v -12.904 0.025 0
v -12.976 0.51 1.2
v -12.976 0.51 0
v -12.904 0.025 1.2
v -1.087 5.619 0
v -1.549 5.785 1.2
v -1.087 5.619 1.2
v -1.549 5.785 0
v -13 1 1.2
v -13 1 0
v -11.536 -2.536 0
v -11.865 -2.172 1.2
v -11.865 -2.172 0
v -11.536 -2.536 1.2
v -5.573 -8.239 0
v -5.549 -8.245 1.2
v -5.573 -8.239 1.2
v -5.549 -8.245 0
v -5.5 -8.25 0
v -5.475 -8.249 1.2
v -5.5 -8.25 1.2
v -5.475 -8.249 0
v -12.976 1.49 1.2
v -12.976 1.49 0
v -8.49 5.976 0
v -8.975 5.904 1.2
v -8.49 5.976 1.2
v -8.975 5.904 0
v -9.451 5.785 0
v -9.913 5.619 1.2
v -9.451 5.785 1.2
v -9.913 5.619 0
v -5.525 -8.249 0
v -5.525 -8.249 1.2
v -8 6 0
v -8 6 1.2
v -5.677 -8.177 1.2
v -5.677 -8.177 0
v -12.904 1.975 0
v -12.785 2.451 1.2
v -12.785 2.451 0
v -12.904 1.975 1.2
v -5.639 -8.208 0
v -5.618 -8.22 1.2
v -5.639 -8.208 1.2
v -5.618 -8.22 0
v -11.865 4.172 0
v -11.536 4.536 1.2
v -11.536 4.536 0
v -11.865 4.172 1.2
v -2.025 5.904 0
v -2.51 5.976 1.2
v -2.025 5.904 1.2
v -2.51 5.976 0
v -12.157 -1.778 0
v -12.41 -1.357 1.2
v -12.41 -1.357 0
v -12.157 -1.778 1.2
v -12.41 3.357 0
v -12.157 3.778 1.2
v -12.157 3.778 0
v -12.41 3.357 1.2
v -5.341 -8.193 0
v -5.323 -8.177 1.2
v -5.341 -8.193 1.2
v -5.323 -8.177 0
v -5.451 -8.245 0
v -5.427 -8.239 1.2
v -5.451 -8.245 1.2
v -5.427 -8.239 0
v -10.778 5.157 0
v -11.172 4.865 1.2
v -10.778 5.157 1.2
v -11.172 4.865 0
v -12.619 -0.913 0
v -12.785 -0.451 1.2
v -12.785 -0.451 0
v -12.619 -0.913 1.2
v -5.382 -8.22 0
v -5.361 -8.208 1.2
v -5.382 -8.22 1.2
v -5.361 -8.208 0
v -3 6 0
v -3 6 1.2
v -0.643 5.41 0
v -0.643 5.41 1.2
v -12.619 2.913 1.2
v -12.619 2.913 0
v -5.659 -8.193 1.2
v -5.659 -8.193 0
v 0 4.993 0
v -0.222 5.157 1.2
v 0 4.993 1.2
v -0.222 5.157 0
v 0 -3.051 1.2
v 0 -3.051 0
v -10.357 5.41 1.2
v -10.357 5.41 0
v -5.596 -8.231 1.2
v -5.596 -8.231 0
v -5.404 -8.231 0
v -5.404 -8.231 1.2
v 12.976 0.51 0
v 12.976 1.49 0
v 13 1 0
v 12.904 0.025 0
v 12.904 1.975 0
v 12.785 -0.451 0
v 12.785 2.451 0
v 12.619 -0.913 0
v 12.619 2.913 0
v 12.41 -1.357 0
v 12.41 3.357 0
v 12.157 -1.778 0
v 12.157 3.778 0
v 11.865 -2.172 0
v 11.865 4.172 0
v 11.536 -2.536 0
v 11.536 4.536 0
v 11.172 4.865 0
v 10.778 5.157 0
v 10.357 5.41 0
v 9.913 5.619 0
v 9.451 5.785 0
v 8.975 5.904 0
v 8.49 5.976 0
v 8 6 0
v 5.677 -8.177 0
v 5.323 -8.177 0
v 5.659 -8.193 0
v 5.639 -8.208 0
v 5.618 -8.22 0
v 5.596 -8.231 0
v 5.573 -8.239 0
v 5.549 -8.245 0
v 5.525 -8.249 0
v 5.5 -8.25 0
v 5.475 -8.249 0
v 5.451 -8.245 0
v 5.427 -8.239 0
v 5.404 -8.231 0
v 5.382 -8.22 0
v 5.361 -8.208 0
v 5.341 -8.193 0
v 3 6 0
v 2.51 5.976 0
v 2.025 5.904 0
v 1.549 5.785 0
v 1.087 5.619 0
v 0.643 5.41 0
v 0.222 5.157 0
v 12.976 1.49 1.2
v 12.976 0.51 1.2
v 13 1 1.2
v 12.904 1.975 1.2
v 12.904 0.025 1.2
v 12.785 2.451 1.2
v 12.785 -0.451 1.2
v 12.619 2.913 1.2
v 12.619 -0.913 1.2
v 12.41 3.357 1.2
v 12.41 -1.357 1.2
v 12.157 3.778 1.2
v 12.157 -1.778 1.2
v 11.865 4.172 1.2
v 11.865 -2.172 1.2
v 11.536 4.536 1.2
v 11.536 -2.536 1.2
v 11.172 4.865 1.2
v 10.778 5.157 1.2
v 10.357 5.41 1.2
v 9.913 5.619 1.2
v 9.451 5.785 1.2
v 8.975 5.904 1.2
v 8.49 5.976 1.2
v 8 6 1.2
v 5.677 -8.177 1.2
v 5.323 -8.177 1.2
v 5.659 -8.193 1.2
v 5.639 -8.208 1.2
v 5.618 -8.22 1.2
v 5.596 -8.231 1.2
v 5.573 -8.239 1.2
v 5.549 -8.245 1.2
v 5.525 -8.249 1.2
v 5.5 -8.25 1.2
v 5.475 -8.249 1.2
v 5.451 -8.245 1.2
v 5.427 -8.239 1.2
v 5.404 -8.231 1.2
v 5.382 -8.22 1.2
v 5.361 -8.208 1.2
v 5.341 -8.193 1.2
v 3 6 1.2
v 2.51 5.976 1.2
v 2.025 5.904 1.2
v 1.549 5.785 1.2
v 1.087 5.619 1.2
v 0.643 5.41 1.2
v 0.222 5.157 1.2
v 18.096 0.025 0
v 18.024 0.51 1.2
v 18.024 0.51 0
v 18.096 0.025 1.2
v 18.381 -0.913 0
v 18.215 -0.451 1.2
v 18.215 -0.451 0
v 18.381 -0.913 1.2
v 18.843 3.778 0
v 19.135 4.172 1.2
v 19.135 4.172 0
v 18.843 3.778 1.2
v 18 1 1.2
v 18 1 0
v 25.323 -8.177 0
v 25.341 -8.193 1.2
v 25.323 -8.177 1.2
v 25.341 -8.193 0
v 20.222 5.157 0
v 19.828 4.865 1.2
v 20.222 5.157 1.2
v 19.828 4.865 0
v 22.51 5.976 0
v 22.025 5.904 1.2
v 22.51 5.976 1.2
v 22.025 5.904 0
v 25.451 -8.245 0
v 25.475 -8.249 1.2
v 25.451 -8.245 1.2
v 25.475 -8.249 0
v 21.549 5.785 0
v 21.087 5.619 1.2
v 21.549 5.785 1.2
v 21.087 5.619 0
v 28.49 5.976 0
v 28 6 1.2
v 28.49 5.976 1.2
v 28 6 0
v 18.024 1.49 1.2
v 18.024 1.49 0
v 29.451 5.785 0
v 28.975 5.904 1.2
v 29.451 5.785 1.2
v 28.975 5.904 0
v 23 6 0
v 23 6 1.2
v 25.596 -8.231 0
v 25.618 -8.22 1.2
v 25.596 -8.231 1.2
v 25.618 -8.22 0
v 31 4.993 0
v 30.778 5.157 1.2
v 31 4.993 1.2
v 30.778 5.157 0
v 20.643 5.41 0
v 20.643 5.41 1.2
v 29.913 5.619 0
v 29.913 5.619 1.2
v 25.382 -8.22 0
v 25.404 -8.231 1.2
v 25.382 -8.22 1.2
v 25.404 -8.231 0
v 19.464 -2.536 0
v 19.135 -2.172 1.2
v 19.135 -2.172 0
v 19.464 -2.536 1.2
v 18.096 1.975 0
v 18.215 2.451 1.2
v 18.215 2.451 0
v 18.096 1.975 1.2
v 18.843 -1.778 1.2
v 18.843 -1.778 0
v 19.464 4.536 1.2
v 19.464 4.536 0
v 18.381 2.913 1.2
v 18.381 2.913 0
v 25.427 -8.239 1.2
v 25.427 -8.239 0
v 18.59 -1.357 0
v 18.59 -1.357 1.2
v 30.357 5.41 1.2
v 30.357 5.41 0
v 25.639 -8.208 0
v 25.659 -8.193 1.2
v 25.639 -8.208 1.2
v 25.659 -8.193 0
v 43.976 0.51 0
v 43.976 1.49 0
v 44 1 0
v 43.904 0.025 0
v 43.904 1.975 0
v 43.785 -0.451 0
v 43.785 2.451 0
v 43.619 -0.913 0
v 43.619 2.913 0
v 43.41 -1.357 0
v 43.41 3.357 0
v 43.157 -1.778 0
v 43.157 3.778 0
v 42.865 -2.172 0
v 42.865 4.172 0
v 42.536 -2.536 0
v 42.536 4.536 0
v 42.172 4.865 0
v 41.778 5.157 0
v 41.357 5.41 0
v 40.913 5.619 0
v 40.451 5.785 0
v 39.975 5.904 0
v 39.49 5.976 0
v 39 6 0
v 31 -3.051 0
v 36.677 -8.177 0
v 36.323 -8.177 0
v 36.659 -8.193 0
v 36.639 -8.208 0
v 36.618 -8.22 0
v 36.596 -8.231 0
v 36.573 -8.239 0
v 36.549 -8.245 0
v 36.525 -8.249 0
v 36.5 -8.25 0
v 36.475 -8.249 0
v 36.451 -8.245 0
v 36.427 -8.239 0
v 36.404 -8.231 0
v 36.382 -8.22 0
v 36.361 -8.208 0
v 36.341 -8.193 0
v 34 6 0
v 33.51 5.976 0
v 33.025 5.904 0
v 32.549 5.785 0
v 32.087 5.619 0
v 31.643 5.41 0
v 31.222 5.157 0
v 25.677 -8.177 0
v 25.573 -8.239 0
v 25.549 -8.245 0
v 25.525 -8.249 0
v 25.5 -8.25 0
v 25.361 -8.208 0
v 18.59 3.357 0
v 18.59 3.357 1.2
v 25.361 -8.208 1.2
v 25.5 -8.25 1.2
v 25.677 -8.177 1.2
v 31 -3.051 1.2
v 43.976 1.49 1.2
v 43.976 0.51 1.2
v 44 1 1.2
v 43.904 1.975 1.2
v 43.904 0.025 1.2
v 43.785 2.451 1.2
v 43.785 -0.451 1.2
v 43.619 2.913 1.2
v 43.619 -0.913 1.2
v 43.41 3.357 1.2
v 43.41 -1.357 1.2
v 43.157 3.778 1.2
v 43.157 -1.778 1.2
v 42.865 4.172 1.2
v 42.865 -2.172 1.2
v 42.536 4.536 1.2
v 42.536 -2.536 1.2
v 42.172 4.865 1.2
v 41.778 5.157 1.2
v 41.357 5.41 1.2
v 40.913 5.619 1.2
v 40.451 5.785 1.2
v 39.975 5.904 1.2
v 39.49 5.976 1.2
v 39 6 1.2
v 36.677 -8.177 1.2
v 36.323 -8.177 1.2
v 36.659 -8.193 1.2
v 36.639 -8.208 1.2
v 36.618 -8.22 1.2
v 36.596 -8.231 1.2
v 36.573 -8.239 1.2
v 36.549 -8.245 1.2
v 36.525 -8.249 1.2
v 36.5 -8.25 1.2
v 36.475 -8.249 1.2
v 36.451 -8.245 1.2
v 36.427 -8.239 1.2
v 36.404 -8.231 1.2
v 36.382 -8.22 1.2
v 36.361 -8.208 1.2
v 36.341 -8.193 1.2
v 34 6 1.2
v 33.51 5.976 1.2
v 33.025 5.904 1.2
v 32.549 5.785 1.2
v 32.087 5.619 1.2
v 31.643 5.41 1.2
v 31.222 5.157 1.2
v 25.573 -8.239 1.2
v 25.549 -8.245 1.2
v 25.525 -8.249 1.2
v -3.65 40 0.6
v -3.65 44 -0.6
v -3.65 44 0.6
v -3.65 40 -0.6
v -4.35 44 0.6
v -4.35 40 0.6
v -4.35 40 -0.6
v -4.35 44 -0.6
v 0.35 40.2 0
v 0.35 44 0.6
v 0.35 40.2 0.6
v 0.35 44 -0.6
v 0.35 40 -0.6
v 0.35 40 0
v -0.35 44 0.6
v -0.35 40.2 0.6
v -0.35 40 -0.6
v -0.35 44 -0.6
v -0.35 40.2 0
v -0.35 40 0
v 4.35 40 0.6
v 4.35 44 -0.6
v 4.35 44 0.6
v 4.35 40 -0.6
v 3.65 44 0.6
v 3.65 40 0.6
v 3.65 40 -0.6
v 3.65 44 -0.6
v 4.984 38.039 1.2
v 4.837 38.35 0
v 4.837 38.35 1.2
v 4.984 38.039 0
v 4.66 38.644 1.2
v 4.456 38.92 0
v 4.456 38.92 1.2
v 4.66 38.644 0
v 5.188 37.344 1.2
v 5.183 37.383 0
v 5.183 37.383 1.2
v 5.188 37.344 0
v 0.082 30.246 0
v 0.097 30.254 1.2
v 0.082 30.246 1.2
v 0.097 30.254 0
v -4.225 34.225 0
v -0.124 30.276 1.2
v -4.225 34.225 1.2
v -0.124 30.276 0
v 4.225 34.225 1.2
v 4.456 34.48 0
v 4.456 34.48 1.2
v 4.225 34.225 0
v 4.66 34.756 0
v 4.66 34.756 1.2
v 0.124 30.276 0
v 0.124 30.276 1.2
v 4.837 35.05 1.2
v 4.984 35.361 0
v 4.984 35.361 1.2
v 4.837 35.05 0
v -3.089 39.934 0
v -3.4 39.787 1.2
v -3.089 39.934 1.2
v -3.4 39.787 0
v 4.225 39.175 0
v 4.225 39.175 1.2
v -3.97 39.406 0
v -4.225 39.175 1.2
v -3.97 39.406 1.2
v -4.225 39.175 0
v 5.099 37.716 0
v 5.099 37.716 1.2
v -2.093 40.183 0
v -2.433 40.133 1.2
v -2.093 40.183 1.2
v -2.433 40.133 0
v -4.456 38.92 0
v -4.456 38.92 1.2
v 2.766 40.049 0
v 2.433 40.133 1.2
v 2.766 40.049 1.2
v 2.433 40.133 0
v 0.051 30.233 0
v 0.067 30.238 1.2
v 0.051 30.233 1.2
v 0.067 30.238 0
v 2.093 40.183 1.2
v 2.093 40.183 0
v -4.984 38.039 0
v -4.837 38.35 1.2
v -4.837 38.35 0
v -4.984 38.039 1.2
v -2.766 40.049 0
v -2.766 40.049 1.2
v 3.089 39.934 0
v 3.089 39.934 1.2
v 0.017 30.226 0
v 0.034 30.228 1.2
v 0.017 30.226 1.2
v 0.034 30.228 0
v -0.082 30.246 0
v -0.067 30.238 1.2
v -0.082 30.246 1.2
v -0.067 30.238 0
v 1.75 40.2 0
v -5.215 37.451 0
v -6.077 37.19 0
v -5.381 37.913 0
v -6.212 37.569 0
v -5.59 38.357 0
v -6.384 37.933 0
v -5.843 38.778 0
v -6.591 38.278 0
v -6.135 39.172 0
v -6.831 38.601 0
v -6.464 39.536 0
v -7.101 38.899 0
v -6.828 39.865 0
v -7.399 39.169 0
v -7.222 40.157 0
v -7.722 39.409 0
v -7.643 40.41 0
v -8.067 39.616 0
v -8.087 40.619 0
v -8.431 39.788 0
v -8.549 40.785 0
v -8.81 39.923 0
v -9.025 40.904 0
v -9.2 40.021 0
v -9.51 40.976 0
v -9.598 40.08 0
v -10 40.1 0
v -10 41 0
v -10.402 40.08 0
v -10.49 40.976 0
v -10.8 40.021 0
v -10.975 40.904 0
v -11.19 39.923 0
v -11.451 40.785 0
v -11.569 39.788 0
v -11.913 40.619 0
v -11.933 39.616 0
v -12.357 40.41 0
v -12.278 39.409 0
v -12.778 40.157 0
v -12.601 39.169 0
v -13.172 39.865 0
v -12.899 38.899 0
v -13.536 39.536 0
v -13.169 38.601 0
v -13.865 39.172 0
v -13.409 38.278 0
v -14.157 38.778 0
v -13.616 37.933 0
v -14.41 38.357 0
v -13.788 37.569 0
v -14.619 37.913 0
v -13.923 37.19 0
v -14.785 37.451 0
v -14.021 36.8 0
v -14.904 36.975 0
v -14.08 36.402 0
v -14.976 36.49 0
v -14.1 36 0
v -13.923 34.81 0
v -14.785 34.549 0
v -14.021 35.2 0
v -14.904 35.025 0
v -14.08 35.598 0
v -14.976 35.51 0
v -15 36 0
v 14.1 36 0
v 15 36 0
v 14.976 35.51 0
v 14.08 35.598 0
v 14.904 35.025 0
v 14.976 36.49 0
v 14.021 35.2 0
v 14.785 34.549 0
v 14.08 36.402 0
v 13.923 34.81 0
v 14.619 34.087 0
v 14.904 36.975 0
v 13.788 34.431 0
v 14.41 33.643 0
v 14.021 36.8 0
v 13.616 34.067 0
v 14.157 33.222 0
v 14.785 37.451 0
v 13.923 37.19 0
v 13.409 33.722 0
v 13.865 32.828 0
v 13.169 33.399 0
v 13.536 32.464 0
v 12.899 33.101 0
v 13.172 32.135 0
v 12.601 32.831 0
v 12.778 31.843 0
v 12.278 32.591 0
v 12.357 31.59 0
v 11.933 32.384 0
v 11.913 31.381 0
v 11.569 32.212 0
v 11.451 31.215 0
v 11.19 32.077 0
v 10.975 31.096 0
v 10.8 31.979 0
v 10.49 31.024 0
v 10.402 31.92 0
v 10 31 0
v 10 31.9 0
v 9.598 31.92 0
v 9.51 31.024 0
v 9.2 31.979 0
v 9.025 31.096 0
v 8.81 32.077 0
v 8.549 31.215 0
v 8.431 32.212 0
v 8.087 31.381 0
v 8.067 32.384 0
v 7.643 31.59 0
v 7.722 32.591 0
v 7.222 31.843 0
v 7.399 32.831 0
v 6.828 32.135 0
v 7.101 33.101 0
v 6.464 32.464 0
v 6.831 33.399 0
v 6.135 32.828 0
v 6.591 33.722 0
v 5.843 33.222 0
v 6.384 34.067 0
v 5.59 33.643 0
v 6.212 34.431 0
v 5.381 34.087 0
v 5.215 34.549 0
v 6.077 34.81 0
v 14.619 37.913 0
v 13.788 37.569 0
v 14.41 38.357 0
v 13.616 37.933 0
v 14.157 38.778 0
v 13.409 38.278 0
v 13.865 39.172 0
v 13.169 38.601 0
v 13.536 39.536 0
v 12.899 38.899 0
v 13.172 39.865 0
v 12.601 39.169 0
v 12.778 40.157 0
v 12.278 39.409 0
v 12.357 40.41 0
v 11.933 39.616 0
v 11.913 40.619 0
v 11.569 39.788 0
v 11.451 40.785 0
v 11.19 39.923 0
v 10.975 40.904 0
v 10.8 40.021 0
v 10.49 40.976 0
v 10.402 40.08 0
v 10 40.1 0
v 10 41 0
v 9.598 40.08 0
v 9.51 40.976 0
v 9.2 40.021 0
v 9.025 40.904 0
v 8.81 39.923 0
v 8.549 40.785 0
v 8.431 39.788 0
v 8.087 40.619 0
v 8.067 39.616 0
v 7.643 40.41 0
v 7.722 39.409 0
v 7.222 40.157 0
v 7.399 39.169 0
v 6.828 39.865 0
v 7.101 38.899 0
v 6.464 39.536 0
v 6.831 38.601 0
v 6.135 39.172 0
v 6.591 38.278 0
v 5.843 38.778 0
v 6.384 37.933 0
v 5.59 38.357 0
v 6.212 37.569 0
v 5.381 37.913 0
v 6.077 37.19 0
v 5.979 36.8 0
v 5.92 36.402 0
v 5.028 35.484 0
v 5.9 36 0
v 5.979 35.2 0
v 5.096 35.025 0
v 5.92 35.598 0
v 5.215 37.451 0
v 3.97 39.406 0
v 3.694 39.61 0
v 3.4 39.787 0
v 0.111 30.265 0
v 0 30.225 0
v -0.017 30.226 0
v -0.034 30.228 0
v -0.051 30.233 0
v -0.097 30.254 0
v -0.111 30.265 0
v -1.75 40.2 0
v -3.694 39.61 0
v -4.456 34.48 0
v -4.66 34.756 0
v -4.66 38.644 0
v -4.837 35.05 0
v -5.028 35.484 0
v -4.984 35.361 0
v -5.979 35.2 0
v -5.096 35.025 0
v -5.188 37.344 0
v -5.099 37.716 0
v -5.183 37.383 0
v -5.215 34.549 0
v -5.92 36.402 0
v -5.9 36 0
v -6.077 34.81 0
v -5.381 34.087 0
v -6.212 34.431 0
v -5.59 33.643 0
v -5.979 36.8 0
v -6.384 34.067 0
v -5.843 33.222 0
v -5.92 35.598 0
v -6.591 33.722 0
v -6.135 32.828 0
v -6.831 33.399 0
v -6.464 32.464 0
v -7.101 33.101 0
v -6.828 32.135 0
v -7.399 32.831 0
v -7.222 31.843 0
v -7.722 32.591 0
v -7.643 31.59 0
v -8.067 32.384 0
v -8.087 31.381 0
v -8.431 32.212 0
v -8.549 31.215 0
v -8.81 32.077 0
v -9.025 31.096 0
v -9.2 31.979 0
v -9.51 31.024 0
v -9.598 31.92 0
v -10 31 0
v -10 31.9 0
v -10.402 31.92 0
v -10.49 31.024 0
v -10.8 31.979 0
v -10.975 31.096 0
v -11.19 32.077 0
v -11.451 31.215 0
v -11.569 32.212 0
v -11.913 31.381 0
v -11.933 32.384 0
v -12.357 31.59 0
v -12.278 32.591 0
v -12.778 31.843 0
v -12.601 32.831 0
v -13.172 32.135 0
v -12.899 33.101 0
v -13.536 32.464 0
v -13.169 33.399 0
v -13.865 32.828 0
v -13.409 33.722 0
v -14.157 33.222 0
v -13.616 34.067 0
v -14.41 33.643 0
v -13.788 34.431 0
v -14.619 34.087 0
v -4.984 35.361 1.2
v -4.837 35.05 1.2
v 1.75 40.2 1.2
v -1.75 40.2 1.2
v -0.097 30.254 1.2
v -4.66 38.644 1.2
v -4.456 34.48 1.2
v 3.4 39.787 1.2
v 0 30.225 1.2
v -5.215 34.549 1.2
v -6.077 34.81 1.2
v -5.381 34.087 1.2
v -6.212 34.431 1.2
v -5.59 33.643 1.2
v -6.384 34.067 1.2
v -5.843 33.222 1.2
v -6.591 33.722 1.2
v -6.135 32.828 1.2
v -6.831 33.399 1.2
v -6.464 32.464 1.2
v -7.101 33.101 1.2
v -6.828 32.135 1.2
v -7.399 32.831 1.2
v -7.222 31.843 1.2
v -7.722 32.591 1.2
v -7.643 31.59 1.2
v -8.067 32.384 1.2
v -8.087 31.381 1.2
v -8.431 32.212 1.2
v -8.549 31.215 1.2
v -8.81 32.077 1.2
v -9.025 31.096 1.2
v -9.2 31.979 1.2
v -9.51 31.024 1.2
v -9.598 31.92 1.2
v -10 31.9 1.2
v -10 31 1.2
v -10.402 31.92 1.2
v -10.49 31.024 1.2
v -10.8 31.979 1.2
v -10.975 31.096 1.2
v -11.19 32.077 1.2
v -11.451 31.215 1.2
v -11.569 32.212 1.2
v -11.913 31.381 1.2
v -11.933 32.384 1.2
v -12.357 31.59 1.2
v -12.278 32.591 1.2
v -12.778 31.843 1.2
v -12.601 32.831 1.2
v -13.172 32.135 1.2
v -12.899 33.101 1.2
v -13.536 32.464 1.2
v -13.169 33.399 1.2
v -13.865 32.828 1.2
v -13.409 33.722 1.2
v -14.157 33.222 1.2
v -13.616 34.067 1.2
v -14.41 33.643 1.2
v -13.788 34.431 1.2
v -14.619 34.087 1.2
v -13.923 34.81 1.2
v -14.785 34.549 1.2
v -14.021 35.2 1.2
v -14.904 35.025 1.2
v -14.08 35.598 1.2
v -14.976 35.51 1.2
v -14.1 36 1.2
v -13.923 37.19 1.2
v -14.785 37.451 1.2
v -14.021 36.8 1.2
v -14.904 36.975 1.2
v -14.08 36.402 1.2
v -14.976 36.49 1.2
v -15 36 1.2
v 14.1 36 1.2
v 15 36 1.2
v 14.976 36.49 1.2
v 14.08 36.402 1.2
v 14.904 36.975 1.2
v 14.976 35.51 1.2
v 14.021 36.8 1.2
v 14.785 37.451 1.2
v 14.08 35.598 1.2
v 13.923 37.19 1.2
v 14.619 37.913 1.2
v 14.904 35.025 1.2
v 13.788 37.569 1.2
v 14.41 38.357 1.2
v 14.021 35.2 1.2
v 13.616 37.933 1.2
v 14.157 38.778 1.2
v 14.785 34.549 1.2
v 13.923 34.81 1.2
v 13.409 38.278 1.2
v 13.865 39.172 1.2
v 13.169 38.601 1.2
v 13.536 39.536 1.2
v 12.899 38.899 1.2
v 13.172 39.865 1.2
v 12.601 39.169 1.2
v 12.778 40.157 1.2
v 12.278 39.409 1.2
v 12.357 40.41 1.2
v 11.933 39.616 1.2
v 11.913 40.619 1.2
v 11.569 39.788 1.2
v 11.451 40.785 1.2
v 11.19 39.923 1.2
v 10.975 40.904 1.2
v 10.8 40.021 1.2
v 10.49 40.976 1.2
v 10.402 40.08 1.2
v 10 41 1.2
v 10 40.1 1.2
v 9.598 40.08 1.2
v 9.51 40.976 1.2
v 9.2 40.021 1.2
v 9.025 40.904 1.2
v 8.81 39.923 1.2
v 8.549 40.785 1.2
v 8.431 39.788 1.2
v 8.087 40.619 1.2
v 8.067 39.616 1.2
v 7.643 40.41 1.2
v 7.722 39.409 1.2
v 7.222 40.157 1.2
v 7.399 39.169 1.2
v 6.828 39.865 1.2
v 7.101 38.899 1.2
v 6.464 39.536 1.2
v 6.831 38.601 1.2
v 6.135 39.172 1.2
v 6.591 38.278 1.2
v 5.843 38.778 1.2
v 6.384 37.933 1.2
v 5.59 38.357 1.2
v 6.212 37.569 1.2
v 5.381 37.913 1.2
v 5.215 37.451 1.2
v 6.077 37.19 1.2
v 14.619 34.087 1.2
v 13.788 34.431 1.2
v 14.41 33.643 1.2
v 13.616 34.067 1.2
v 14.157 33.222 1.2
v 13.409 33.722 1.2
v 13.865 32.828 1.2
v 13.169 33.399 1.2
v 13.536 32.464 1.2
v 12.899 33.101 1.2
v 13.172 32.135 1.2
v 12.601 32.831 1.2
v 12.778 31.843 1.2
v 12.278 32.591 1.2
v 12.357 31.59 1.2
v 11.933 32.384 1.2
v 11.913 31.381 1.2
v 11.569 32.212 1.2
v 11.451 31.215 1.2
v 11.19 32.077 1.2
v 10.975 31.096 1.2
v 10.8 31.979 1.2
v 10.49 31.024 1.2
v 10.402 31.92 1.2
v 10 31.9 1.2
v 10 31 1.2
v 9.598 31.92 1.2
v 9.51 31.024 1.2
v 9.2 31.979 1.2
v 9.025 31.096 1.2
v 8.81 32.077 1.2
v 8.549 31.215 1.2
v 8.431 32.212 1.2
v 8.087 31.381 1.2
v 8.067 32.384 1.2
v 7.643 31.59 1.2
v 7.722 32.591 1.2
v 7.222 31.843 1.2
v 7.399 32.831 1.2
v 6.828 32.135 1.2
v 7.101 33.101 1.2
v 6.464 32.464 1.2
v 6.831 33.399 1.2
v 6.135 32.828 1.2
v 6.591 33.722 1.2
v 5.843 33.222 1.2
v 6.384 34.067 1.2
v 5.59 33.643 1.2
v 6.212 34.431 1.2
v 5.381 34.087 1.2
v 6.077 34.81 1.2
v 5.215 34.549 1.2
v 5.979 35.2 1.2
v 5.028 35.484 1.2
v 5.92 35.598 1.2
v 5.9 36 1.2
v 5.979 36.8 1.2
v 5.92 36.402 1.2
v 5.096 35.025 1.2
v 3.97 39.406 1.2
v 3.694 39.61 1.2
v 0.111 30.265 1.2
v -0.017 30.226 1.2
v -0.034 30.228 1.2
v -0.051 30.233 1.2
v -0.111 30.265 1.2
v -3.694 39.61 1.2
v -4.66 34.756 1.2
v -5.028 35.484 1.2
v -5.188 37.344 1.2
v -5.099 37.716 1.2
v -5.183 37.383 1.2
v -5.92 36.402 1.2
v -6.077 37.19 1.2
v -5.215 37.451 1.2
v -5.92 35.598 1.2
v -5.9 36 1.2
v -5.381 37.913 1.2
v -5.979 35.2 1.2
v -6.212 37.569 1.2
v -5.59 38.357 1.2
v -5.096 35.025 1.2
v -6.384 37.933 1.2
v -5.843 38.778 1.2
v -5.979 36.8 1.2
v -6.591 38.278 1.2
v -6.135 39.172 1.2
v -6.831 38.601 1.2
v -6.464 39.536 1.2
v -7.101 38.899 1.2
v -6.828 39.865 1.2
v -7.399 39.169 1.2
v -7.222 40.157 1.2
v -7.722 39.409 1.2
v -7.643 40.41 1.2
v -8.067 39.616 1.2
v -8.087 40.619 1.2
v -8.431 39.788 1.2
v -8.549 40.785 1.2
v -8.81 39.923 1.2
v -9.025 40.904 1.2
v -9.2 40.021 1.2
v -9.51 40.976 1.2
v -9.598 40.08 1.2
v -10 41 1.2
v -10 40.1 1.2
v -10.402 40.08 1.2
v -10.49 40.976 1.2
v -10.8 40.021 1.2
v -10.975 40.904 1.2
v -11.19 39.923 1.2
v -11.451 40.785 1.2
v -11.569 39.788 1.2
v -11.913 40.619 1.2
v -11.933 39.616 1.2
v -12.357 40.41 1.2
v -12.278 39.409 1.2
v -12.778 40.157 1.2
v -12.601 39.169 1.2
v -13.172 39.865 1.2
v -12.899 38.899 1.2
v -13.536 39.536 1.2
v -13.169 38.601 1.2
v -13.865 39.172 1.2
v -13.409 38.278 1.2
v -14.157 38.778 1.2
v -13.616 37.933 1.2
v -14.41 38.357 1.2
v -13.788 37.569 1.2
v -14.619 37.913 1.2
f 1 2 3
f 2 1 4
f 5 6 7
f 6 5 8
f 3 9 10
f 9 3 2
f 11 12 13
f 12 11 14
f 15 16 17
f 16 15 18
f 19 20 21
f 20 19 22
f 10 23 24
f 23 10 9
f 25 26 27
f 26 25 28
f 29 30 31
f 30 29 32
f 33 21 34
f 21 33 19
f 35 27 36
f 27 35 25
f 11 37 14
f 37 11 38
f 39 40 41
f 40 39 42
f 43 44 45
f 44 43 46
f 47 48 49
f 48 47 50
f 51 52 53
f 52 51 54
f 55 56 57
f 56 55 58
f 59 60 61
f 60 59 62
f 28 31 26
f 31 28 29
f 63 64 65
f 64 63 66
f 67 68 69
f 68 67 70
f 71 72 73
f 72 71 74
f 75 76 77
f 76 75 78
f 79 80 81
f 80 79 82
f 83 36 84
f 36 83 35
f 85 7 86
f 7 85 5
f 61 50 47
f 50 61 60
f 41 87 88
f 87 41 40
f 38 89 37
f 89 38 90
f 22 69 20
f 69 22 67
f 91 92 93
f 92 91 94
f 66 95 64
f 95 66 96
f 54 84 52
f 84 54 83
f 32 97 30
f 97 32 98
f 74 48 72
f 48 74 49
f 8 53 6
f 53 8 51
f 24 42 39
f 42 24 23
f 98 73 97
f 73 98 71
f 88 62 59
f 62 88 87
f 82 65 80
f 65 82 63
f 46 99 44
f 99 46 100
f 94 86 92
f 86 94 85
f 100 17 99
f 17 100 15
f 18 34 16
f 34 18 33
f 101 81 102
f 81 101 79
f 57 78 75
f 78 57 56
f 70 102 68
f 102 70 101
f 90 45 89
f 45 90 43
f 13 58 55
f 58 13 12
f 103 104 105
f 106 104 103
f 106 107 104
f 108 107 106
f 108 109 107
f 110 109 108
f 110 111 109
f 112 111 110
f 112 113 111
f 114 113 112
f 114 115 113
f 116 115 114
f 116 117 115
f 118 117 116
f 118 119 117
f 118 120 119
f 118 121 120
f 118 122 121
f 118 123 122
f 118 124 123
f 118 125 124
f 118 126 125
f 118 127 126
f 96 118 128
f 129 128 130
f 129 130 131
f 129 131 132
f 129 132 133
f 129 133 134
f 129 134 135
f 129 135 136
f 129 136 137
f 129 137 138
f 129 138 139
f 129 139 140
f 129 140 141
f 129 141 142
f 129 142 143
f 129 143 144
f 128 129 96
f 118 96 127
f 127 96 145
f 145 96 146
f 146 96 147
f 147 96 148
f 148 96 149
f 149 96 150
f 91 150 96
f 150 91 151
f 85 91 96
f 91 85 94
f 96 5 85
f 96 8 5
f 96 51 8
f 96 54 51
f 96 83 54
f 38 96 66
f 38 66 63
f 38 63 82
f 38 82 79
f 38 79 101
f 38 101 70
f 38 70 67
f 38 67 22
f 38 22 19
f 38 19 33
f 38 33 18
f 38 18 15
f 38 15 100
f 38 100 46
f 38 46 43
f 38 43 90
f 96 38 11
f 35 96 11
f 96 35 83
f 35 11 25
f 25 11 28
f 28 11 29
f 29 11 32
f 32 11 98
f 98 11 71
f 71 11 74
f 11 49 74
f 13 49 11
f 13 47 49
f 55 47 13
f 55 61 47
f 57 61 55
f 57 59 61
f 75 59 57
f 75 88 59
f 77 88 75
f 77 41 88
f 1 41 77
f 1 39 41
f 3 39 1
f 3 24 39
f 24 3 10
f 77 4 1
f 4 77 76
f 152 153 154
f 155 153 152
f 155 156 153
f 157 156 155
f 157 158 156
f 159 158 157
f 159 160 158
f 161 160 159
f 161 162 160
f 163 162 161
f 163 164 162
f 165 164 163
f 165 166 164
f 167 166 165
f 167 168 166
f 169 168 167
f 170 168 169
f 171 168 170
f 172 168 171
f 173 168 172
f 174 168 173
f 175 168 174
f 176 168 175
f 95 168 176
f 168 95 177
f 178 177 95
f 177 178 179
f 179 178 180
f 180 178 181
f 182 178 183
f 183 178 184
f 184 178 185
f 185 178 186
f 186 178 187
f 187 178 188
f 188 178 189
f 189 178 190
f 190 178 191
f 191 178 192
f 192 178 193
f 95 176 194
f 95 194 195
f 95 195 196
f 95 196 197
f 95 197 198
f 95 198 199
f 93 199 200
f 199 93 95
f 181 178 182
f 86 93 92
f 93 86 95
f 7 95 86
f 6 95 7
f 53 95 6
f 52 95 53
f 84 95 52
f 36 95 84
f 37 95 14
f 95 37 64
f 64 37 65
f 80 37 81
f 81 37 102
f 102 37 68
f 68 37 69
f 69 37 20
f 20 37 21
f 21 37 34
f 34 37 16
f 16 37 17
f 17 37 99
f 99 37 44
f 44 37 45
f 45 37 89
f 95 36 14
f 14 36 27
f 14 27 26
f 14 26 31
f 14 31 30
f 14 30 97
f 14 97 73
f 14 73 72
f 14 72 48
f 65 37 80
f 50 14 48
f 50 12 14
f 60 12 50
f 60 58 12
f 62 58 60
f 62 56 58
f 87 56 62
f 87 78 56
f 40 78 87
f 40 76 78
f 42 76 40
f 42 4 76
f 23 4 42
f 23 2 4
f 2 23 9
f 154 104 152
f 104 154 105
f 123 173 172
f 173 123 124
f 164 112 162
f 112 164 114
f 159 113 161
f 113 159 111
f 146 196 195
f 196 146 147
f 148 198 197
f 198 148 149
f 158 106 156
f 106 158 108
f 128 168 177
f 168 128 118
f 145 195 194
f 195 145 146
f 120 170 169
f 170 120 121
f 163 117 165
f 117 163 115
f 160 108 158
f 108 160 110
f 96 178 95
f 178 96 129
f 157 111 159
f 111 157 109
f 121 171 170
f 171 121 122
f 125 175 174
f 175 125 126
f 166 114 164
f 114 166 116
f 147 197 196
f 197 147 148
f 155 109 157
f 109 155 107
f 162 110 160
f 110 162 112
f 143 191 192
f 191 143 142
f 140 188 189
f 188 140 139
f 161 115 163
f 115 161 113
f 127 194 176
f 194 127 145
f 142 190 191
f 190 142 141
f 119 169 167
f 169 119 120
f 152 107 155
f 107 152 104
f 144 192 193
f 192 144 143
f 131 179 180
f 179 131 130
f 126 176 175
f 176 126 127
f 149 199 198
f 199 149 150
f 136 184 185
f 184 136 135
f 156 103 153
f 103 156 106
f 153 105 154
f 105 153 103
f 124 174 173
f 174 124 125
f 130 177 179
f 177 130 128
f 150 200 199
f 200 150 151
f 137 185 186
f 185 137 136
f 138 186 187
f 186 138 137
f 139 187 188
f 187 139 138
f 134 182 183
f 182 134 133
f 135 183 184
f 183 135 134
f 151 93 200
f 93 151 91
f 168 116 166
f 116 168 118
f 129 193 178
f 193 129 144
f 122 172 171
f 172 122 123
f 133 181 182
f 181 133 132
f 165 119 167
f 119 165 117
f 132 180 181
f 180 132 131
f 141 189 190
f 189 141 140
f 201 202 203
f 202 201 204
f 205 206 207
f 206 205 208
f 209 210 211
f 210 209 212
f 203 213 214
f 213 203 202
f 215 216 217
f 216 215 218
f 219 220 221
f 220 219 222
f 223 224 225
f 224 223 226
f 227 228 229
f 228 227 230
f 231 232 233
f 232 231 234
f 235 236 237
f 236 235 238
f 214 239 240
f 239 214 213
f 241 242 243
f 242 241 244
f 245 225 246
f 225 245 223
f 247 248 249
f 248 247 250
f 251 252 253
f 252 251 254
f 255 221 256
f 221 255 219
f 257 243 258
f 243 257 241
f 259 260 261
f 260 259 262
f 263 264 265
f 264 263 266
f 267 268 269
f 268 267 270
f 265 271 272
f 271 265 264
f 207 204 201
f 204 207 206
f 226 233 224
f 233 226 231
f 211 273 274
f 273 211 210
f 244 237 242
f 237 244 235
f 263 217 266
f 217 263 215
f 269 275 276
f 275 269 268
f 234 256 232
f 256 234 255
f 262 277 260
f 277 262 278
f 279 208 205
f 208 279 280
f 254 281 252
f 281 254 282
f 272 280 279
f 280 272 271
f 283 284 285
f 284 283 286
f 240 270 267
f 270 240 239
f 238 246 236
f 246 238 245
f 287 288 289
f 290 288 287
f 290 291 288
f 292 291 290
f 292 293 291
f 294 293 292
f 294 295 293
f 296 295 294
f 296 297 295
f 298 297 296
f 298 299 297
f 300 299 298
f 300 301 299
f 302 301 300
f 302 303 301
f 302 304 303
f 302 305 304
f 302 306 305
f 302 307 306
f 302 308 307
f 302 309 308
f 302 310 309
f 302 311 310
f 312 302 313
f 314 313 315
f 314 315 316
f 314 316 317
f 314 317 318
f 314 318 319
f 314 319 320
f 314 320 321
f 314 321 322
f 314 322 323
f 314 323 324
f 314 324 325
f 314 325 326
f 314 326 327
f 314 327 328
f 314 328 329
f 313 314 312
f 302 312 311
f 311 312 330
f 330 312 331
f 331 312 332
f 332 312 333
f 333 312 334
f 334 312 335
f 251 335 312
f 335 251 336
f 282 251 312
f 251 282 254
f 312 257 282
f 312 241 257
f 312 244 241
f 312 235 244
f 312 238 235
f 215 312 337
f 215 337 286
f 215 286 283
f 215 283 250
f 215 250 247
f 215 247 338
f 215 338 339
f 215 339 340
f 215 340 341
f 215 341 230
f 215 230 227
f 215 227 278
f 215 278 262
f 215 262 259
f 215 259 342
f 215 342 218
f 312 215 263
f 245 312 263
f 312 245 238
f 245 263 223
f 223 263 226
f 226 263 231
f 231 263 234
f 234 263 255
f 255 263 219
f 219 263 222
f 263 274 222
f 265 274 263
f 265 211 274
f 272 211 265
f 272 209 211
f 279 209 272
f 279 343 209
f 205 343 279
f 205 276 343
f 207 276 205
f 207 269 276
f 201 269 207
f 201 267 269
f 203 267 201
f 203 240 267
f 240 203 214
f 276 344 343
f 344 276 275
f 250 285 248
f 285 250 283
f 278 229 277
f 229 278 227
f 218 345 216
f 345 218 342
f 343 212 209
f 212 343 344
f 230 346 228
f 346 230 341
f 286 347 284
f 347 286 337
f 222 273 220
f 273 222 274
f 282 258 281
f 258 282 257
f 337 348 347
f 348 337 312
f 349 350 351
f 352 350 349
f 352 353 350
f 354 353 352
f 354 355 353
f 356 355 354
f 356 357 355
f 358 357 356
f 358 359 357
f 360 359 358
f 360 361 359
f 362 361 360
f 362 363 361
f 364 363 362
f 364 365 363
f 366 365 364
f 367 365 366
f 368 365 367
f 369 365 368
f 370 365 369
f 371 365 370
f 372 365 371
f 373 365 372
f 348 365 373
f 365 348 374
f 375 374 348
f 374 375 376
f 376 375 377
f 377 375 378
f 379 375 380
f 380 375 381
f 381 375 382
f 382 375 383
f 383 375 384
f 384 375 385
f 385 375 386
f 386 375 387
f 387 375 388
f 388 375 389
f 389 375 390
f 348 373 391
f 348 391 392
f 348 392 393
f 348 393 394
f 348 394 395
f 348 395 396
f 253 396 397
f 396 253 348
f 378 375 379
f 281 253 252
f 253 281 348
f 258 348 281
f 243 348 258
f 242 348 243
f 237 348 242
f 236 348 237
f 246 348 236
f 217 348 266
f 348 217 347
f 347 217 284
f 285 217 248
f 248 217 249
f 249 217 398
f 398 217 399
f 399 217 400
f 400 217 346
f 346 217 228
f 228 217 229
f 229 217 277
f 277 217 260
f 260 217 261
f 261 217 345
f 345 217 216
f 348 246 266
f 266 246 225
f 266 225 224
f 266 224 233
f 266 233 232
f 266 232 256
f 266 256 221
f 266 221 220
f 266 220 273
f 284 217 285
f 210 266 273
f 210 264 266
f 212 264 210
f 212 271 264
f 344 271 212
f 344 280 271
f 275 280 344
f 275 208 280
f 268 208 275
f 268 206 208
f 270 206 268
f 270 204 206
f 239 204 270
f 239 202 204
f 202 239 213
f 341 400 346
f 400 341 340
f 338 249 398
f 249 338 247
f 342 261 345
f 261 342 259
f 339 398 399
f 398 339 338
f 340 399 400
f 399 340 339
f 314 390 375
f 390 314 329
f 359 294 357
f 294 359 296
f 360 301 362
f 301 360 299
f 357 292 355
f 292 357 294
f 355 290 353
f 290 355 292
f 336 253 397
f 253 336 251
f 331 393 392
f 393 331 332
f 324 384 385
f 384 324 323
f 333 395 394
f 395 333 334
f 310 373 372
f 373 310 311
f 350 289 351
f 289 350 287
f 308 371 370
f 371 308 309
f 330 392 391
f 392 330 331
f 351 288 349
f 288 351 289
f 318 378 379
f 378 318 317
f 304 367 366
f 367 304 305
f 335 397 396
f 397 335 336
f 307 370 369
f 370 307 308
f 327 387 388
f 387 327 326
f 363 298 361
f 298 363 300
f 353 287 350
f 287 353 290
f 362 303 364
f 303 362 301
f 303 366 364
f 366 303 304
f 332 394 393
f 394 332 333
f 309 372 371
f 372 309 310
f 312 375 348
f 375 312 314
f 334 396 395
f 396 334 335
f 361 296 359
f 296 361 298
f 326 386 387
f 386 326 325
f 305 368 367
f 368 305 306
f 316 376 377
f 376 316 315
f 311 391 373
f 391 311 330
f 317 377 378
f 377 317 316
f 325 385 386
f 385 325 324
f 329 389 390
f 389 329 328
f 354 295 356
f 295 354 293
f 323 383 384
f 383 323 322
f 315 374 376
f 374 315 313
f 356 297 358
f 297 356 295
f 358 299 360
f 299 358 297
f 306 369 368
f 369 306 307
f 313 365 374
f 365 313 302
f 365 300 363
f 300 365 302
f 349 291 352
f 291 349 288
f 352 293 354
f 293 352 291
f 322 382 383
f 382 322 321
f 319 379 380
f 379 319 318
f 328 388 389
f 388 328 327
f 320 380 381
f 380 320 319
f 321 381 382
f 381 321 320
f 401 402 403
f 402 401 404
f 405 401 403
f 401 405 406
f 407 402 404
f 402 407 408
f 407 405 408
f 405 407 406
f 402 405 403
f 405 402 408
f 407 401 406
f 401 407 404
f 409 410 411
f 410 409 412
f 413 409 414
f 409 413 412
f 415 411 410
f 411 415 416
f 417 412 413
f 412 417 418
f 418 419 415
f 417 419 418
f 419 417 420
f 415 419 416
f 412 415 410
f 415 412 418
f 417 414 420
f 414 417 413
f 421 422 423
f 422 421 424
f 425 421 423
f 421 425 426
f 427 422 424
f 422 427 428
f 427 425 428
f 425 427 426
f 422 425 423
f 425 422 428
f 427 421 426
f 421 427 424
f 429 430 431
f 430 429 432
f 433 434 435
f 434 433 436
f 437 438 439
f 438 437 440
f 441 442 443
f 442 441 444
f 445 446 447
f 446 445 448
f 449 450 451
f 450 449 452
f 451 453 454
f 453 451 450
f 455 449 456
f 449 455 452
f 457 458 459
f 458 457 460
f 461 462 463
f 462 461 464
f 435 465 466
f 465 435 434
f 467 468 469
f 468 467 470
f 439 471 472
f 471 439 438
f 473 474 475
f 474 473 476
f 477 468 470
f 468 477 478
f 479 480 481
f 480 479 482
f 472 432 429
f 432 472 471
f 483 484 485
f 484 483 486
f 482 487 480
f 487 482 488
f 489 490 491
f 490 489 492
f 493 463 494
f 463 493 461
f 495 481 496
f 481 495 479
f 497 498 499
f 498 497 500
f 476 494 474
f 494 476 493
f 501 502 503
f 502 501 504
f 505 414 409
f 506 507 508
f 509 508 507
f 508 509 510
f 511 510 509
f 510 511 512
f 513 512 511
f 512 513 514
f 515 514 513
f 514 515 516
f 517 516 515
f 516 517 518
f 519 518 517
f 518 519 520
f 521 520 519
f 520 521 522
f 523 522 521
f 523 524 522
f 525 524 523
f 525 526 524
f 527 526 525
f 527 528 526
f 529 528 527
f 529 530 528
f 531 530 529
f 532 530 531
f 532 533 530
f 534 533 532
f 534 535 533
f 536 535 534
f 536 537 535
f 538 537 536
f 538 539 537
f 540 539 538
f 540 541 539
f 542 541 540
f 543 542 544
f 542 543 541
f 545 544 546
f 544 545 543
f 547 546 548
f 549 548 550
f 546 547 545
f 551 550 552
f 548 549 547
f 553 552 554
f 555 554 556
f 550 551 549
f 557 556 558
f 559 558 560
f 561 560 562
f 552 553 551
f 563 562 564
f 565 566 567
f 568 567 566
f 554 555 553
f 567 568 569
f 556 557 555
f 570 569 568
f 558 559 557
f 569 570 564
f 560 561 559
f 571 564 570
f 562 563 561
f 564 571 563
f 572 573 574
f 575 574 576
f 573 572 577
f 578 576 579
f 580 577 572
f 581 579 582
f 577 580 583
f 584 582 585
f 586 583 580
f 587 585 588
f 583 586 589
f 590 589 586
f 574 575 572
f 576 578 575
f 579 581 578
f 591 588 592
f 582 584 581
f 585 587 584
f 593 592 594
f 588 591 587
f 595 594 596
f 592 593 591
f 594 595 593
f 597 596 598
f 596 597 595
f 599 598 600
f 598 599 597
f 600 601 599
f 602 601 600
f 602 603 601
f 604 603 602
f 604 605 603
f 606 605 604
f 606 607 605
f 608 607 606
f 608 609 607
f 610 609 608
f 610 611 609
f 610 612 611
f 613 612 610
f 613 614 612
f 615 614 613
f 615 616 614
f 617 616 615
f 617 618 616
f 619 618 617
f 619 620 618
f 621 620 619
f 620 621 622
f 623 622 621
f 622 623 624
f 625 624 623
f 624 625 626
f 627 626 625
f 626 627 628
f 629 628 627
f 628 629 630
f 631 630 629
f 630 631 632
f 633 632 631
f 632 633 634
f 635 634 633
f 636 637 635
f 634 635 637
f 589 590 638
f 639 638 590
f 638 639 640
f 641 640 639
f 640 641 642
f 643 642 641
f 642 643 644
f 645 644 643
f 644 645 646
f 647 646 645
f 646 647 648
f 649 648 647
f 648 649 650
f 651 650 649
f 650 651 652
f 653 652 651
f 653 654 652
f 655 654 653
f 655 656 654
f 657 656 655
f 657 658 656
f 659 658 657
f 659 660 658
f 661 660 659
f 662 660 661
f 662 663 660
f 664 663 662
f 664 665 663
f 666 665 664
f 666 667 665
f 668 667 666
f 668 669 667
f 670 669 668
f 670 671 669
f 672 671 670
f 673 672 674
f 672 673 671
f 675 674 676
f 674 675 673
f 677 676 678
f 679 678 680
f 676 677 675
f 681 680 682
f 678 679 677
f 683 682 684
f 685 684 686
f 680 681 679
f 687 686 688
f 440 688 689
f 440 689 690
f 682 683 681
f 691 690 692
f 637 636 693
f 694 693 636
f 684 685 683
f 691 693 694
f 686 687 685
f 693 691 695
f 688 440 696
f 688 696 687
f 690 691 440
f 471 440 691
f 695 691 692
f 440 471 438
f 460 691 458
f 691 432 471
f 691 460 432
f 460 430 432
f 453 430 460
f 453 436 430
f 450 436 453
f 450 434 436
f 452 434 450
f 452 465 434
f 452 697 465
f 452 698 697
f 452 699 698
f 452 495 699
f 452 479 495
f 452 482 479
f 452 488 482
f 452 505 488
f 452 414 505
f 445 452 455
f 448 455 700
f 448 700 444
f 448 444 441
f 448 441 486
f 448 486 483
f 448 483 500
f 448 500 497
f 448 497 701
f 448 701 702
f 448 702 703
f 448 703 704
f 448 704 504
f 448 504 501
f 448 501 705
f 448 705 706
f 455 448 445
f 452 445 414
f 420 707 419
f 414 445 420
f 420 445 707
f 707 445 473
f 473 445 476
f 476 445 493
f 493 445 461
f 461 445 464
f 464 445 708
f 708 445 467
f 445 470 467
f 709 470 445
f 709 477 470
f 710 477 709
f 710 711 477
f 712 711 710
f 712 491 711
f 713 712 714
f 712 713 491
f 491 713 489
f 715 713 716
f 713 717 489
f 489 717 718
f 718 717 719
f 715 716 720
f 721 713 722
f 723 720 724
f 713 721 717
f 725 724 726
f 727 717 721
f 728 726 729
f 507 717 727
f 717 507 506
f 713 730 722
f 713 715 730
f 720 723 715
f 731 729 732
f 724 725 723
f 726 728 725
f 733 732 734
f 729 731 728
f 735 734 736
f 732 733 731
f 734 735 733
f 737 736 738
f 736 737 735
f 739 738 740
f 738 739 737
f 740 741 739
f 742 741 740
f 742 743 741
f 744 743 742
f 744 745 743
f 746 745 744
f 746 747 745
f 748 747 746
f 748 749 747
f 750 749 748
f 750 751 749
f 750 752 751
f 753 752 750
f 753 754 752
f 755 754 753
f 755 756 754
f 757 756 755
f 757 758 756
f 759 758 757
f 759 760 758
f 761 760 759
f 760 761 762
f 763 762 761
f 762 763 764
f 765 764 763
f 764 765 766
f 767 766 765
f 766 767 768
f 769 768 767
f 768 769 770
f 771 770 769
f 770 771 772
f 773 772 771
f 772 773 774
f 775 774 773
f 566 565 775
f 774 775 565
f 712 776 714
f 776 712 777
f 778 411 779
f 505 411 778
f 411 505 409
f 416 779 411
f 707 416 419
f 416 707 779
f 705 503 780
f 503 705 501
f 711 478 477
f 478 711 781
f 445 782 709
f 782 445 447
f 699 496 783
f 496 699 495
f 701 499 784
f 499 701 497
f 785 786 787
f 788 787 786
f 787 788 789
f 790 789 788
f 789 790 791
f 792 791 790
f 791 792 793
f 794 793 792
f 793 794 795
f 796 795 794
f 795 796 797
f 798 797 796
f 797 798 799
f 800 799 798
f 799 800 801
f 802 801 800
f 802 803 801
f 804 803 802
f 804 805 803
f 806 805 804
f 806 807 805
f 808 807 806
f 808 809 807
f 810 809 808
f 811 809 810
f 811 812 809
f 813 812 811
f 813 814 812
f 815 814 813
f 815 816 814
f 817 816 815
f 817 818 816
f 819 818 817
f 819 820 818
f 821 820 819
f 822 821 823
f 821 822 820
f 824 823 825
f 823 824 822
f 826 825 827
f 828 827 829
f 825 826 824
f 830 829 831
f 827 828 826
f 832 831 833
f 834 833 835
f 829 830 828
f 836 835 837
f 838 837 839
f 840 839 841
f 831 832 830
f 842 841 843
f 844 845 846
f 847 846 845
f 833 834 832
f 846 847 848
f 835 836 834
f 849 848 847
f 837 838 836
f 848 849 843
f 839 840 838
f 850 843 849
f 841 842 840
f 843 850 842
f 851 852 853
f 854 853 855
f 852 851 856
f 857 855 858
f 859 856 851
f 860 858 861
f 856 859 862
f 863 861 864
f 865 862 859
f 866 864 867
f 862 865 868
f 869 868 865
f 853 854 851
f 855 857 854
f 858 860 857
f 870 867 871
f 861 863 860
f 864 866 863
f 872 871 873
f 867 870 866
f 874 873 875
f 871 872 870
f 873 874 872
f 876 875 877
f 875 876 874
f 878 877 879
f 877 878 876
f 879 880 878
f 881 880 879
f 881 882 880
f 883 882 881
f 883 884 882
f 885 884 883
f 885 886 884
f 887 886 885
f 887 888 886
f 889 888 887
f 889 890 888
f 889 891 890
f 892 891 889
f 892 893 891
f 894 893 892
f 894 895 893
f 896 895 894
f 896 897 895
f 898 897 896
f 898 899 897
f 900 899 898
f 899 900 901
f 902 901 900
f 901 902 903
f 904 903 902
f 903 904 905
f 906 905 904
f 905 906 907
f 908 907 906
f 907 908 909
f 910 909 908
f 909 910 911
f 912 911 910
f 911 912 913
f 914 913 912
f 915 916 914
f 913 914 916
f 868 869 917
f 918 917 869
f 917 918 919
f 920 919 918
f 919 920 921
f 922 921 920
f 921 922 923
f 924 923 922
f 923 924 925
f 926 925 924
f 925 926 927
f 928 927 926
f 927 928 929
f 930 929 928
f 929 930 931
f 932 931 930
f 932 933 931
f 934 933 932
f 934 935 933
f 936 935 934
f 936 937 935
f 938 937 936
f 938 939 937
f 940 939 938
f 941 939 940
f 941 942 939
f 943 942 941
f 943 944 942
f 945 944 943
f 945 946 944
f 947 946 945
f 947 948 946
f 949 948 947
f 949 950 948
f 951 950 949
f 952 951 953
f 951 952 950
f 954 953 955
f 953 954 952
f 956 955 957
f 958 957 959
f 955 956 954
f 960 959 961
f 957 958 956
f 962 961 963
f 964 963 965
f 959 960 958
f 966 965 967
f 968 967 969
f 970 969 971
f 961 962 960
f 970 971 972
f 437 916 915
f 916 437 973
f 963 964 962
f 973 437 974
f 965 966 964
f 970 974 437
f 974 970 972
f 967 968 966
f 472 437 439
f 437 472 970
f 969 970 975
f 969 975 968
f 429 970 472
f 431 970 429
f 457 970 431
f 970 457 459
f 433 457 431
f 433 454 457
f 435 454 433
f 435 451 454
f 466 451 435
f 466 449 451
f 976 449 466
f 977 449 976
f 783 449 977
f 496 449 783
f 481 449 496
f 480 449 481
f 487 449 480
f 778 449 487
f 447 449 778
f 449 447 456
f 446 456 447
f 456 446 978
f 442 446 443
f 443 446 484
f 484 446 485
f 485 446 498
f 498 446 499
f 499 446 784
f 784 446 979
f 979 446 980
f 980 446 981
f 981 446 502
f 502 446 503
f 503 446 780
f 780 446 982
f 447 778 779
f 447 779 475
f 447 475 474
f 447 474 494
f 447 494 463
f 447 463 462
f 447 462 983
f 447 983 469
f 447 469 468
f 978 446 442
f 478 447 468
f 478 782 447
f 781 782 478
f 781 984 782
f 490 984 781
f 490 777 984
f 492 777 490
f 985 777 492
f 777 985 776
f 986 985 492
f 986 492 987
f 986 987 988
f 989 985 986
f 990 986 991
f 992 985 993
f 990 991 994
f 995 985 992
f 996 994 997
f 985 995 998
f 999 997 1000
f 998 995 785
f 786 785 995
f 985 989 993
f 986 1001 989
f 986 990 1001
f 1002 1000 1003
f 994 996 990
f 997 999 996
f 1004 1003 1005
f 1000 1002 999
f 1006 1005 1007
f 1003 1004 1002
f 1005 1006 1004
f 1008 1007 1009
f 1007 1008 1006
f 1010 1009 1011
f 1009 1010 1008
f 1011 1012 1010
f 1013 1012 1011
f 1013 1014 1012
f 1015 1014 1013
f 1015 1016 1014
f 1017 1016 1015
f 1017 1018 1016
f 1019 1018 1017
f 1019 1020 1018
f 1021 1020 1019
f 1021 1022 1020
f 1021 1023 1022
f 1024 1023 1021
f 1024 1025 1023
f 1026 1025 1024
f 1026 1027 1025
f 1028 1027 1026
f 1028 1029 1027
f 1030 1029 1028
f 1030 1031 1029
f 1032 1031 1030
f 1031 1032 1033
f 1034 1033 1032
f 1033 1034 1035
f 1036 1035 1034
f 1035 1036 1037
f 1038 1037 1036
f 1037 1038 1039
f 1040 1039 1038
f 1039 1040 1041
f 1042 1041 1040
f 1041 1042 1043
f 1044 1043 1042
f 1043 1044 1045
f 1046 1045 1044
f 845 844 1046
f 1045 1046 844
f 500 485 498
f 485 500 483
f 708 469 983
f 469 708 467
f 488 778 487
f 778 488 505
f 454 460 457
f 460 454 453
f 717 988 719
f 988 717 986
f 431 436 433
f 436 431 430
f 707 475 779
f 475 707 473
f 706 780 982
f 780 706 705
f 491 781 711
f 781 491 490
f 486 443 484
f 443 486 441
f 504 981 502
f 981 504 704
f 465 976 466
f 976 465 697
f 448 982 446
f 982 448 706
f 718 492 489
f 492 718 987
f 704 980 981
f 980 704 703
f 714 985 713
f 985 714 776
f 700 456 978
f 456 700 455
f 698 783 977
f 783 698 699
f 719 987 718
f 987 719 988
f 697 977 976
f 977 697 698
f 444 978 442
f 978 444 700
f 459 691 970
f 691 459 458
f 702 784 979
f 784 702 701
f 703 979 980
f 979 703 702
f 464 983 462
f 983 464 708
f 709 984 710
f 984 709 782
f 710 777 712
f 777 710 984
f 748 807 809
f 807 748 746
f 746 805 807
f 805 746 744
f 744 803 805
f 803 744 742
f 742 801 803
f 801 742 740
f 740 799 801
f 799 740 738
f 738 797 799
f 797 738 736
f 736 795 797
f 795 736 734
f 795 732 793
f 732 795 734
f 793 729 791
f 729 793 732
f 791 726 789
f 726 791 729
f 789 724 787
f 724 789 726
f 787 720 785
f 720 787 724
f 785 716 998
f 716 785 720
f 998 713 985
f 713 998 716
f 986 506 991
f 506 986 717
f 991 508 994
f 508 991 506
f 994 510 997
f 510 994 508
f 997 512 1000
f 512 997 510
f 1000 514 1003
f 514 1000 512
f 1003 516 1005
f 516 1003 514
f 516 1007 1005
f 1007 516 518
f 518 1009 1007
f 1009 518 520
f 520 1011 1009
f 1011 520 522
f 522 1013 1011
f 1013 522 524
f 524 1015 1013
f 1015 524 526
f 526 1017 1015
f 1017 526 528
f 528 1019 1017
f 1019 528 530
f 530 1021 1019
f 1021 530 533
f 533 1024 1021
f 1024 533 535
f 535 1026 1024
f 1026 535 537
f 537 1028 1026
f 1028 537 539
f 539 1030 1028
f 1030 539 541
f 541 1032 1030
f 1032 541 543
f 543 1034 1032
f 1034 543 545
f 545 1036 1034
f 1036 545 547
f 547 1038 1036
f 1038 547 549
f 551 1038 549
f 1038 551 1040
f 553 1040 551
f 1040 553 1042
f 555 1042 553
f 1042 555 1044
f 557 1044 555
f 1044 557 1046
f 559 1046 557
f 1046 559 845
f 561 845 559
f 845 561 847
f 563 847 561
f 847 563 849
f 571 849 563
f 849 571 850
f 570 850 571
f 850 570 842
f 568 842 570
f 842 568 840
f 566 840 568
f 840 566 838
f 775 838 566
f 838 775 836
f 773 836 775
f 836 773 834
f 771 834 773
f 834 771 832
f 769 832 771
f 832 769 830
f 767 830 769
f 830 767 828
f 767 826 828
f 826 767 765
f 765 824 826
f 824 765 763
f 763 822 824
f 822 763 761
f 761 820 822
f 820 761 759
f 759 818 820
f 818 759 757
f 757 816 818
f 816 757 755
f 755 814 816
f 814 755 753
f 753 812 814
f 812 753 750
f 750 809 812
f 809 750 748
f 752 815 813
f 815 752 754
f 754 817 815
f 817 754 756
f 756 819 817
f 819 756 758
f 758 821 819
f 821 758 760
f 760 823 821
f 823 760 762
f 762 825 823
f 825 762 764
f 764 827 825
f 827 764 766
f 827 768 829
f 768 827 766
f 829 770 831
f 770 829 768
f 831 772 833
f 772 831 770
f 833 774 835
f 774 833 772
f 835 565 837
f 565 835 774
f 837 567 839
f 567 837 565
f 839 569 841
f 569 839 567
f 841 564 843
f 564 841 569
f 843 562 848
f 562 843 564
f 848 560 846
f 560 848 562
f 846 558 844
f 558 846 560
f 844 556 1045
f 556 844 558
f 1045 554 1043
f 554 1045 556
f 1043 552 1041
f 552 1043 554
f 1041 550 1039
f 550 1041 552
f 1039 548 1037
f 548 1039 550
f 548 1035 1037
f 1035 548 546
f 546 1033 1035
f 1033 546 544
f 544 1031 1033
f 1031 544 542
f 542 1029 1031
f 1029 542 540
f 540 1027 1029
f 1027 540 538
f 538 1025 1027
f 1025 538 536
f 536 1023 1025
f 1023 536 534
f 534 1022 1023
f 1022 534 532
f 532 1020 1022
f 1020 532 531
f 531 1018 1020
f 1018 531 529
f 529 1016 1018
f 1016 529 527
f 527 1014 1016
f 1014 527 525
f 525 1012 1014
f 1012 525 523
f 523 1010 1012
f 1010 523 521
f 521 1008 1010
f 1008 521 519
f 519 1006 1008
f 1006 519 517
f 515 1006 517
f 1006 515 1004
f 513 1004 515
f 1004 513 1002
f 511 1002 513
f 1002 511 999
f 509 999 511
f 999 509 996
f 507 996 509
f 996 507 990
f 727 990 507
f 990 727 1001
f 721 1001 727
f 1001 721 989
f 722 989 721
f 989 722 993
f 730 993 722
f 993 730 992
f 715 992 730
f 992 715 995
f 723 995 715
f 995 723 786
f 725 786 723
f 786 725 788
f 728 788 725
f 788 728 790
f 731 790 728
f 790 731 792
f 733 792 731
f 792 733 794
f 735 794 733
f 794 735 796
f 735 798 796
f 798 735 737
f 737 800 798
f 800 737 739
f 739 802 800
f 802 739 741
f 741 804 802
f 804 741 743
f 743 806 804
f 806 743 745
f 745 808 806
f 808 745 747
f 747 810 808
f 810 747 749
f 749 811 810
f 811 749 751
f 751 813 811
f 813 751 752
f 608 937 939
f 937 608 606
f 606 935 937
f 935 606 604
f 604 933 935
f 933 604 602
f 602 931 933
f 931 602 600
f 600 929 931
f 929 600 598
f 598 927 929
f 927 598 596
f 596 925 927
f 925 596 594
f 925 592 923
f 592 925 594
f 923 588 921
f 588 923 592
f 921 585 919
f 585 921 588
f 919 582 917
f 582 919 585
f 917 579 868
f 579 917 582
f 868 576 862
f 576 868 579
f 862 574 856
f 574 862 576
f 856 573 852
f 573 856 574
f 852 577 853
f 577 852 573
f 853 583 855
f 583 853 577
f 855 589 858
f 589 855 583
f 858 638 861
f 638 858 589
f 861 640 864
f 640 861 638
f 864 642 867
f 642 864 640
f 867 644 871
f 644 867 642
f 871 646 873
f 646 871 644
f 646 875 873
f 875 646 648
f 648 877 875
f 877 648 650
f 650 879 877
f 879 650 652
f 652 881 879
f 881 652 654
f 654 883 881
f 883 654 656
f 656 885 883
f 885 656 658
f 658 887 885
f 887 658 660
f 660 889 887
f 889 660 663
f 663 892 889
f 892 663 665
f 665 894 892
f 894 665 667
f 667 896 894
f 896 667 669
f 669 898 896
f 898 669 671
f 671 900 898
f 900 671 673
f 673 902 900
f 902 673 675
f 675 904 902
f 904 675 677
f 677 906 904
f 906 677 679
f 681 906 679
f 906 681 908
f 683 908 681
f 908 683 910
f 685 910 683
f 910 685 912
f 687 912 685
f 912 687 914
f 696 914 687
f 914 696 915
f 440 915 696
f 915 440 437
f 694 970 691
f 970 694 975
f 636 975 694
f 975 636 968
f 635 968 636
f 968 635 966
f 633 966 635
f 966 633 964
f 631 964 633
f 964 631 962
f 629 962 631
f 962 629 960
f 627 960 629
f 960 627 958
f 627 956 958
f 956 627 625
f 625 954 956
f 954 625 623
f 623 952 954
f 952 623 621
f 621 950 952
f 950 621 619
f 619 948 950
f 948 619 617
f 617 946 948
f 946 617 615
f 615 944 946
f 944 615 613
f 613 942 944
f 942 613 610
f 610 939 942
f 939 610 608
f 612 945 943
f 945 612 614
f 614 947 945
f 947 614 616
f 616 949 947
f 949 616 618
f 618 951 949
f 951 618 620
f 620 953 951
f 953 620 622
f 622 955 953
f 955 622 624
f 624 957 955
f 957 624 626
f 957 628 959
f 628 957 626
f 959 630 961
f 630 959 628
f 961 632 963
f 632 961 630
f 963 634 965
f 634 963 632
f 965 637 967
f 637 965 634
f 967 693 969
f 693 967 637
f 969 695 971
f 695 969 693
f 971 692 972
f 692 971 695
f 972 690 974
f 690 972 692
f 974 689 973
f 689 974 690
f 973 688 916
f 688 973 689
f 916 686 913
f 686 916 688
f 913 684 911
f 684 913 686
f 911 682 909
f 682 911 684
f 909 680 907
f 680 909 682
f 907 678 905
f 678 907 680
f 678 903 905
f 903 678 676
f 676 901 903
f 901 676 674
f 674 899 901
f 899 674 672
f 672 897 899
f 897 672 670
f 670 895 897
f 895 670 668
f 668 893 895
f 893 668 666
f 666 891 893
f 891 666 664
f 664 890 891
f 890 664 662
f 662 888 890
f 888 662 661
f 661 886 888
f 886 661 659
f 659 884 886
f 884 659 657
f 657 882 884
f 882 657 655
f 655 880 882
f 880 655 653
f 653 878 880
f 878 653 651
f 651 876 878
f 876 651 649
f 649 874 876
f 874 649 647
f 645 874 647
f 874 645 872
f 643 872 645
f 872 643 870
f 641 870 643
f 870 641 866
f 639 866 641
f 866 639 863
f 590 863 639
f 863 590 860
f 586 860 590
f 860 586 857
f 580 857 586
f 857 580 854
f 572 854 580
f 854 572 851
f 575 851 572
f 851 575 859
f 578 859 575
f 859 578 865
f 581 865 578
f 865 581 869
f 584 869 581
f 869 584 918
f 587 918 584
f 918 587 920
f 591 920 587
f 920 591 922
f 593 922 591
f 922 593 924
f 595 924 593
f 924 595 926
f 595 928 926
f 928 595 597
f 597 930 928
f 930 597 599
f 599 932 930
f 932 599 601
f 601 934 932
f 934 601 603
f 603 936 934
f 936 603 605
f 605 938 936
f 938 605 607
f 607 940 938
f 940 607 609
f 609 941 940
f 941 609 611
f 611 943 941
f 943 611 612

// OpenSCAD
// symbolic-stress.scad
// benchmark family: symbolic stress
// purpose: a claddagh-like motif and a double-heart base at production scale.
//   thin joined sections are where symbolic designs actually fail.
//   this family checks that the harness catches wall violations in complex
//   geometry where a naive bounding-box check would pass.
//
// geometry is stylised, not a replica of any protected design.
// all dimensions approximate common production jewelry scale.
// base wall and join thickness:
//   wall minimum 0.8 mm from cooksongold (src-0010, 2026-09-24)
//   bridges/connectors minimum 1.0-1.2 mm from jfd jewelry (src-0004, 2026-09-24)
// overall scale: value unverified, see rule-digest.

/* [symbolic stress parameters] */
// base plate thickness in mm; 1.2 mm is within the bridge/connector range (src-0004)
base_thickness = 1.2;
// join width between hearts in mm; tested at limit and below limit
join_width_safe   = 1.0;   // passes ctr-wall-001 (>= 0.8 mm)
join_width_thin   = 0.6;   // triggers ctr-wall-001 warning (< 0.8 mm)
// heart lobe radius in mm; value unverified, see rule-digest
heart_r = 5;
// spacing between the two test variants in mm
spacing = 6;   // value unverified, see rule-digest

/* [Hidden] */
$fn = 64;

// single heart silhouette: hull of two circles (upper lobes) and a point
// (lower tip). hull() guarantees a convex result with no internal coincident
// edges, avoiding the non-manifold t-junctions that a union of overlapping
// circles and a polygon produces in openscad 2021.01.
module heart_2d(r) {
    offset = r * 0.5;
    hull() {
        translate([-offset, r * 0.2]) circle(r = r);
        translate([ offset, r * 0.2]) circle(r = r);
        // lower tip: tiny circle so hull() produces the pointed bottom
        translate([0, -r * 1.6]) circle(r = r * 0.05);
    }
}

// double heart: two hearts joined at the midline by a bridge of width join_mm
// bridge_overlap: small epsilon so the bridge cube intersects the heart bodies
// rather than touching them face-to-face. touching (coincident) faces in a
// union produce non-manifold output in openscad 2021.01; an epsilon overlap
// ensures the boolean merges cleanly.
module double_heart(join_mm) {
    sep = heart_r * 2.2;
    bridge_len = sep - 2 * heart_r + 2;
    bridge_overlap = 0.1;  // epsilon overlap into each heart body
    union() {
        translate([-sep / 2, 0, 0]) linear_extrude(height = base_thickness)
            heart_2d(heart_r);
        translate([ sep / 2, 0, 0]) linear_extrude(height = base_thickness)
            heart_2d(heart_r);
        // the join bridge extends bridge_overlap into each heart to avoid
        // coincident-face non-manifold issues in the boolean union
        translate([-(bridge_len / 2 + bridge_overlap), -join_mm / 2, 0])
            cube([bridge_len + 2 * bridge_overlap, join_mm, base_thickness]);
    }
}

// claddagh-like: a crown over two hands cradling a heart
// stylised only; no brand reproduction. thin crown tines are the stress point.
module claddagh_like() {
    // central heart
    linear_extrude(height = base_thickness)
        heart_2d(heart_r * 0.7);
    // left hand (simplified arc)
    translate([-heart_r * 2, 0, 0])
        linear_extrude(height = base_thickness)
            difference() {
                circle(r = heart_r);
                circle(r = heart_r - 0.9);  // 0.9 mm wall; above 0.8 mm threshold
            }
    // right hand
    translate([ heart_r * 2, 0, 0])
        linear_extrude(height = base_thickness)
            difference() {
                circle(r = heart_r);
                circle(r = heart_r - 0.9);
            }
    // crown tines: three prongs; tine width 0.7 mm tests below the 0.8 mm wall threshold
    for (x = [-heart_r * 0.8, 0, heart_r * 0.8]) {
        translate([x, heart_r * 1.2, 0])
            cube([0.7, heart_r * 0.8, base_thickness], center = true);
    }
}

// variant 1: safe join (>= 0.8 mm) - passes ctr-wall-001
translate([0, 0, 0])
    double_heart(join_width_safe);

// variant 2: thin join (< 0.8 mm) - warns ctr-wall-001
translate([heart_r * 5 + spacing, 0, 0])
    double_heart(join_width_thin);

// variant 3: claddagh-like motif - crown tines at 0.7 mm trigger wall warning
translate([0, heart_r * 6 + spacing, 0])
    claddagh_like();
